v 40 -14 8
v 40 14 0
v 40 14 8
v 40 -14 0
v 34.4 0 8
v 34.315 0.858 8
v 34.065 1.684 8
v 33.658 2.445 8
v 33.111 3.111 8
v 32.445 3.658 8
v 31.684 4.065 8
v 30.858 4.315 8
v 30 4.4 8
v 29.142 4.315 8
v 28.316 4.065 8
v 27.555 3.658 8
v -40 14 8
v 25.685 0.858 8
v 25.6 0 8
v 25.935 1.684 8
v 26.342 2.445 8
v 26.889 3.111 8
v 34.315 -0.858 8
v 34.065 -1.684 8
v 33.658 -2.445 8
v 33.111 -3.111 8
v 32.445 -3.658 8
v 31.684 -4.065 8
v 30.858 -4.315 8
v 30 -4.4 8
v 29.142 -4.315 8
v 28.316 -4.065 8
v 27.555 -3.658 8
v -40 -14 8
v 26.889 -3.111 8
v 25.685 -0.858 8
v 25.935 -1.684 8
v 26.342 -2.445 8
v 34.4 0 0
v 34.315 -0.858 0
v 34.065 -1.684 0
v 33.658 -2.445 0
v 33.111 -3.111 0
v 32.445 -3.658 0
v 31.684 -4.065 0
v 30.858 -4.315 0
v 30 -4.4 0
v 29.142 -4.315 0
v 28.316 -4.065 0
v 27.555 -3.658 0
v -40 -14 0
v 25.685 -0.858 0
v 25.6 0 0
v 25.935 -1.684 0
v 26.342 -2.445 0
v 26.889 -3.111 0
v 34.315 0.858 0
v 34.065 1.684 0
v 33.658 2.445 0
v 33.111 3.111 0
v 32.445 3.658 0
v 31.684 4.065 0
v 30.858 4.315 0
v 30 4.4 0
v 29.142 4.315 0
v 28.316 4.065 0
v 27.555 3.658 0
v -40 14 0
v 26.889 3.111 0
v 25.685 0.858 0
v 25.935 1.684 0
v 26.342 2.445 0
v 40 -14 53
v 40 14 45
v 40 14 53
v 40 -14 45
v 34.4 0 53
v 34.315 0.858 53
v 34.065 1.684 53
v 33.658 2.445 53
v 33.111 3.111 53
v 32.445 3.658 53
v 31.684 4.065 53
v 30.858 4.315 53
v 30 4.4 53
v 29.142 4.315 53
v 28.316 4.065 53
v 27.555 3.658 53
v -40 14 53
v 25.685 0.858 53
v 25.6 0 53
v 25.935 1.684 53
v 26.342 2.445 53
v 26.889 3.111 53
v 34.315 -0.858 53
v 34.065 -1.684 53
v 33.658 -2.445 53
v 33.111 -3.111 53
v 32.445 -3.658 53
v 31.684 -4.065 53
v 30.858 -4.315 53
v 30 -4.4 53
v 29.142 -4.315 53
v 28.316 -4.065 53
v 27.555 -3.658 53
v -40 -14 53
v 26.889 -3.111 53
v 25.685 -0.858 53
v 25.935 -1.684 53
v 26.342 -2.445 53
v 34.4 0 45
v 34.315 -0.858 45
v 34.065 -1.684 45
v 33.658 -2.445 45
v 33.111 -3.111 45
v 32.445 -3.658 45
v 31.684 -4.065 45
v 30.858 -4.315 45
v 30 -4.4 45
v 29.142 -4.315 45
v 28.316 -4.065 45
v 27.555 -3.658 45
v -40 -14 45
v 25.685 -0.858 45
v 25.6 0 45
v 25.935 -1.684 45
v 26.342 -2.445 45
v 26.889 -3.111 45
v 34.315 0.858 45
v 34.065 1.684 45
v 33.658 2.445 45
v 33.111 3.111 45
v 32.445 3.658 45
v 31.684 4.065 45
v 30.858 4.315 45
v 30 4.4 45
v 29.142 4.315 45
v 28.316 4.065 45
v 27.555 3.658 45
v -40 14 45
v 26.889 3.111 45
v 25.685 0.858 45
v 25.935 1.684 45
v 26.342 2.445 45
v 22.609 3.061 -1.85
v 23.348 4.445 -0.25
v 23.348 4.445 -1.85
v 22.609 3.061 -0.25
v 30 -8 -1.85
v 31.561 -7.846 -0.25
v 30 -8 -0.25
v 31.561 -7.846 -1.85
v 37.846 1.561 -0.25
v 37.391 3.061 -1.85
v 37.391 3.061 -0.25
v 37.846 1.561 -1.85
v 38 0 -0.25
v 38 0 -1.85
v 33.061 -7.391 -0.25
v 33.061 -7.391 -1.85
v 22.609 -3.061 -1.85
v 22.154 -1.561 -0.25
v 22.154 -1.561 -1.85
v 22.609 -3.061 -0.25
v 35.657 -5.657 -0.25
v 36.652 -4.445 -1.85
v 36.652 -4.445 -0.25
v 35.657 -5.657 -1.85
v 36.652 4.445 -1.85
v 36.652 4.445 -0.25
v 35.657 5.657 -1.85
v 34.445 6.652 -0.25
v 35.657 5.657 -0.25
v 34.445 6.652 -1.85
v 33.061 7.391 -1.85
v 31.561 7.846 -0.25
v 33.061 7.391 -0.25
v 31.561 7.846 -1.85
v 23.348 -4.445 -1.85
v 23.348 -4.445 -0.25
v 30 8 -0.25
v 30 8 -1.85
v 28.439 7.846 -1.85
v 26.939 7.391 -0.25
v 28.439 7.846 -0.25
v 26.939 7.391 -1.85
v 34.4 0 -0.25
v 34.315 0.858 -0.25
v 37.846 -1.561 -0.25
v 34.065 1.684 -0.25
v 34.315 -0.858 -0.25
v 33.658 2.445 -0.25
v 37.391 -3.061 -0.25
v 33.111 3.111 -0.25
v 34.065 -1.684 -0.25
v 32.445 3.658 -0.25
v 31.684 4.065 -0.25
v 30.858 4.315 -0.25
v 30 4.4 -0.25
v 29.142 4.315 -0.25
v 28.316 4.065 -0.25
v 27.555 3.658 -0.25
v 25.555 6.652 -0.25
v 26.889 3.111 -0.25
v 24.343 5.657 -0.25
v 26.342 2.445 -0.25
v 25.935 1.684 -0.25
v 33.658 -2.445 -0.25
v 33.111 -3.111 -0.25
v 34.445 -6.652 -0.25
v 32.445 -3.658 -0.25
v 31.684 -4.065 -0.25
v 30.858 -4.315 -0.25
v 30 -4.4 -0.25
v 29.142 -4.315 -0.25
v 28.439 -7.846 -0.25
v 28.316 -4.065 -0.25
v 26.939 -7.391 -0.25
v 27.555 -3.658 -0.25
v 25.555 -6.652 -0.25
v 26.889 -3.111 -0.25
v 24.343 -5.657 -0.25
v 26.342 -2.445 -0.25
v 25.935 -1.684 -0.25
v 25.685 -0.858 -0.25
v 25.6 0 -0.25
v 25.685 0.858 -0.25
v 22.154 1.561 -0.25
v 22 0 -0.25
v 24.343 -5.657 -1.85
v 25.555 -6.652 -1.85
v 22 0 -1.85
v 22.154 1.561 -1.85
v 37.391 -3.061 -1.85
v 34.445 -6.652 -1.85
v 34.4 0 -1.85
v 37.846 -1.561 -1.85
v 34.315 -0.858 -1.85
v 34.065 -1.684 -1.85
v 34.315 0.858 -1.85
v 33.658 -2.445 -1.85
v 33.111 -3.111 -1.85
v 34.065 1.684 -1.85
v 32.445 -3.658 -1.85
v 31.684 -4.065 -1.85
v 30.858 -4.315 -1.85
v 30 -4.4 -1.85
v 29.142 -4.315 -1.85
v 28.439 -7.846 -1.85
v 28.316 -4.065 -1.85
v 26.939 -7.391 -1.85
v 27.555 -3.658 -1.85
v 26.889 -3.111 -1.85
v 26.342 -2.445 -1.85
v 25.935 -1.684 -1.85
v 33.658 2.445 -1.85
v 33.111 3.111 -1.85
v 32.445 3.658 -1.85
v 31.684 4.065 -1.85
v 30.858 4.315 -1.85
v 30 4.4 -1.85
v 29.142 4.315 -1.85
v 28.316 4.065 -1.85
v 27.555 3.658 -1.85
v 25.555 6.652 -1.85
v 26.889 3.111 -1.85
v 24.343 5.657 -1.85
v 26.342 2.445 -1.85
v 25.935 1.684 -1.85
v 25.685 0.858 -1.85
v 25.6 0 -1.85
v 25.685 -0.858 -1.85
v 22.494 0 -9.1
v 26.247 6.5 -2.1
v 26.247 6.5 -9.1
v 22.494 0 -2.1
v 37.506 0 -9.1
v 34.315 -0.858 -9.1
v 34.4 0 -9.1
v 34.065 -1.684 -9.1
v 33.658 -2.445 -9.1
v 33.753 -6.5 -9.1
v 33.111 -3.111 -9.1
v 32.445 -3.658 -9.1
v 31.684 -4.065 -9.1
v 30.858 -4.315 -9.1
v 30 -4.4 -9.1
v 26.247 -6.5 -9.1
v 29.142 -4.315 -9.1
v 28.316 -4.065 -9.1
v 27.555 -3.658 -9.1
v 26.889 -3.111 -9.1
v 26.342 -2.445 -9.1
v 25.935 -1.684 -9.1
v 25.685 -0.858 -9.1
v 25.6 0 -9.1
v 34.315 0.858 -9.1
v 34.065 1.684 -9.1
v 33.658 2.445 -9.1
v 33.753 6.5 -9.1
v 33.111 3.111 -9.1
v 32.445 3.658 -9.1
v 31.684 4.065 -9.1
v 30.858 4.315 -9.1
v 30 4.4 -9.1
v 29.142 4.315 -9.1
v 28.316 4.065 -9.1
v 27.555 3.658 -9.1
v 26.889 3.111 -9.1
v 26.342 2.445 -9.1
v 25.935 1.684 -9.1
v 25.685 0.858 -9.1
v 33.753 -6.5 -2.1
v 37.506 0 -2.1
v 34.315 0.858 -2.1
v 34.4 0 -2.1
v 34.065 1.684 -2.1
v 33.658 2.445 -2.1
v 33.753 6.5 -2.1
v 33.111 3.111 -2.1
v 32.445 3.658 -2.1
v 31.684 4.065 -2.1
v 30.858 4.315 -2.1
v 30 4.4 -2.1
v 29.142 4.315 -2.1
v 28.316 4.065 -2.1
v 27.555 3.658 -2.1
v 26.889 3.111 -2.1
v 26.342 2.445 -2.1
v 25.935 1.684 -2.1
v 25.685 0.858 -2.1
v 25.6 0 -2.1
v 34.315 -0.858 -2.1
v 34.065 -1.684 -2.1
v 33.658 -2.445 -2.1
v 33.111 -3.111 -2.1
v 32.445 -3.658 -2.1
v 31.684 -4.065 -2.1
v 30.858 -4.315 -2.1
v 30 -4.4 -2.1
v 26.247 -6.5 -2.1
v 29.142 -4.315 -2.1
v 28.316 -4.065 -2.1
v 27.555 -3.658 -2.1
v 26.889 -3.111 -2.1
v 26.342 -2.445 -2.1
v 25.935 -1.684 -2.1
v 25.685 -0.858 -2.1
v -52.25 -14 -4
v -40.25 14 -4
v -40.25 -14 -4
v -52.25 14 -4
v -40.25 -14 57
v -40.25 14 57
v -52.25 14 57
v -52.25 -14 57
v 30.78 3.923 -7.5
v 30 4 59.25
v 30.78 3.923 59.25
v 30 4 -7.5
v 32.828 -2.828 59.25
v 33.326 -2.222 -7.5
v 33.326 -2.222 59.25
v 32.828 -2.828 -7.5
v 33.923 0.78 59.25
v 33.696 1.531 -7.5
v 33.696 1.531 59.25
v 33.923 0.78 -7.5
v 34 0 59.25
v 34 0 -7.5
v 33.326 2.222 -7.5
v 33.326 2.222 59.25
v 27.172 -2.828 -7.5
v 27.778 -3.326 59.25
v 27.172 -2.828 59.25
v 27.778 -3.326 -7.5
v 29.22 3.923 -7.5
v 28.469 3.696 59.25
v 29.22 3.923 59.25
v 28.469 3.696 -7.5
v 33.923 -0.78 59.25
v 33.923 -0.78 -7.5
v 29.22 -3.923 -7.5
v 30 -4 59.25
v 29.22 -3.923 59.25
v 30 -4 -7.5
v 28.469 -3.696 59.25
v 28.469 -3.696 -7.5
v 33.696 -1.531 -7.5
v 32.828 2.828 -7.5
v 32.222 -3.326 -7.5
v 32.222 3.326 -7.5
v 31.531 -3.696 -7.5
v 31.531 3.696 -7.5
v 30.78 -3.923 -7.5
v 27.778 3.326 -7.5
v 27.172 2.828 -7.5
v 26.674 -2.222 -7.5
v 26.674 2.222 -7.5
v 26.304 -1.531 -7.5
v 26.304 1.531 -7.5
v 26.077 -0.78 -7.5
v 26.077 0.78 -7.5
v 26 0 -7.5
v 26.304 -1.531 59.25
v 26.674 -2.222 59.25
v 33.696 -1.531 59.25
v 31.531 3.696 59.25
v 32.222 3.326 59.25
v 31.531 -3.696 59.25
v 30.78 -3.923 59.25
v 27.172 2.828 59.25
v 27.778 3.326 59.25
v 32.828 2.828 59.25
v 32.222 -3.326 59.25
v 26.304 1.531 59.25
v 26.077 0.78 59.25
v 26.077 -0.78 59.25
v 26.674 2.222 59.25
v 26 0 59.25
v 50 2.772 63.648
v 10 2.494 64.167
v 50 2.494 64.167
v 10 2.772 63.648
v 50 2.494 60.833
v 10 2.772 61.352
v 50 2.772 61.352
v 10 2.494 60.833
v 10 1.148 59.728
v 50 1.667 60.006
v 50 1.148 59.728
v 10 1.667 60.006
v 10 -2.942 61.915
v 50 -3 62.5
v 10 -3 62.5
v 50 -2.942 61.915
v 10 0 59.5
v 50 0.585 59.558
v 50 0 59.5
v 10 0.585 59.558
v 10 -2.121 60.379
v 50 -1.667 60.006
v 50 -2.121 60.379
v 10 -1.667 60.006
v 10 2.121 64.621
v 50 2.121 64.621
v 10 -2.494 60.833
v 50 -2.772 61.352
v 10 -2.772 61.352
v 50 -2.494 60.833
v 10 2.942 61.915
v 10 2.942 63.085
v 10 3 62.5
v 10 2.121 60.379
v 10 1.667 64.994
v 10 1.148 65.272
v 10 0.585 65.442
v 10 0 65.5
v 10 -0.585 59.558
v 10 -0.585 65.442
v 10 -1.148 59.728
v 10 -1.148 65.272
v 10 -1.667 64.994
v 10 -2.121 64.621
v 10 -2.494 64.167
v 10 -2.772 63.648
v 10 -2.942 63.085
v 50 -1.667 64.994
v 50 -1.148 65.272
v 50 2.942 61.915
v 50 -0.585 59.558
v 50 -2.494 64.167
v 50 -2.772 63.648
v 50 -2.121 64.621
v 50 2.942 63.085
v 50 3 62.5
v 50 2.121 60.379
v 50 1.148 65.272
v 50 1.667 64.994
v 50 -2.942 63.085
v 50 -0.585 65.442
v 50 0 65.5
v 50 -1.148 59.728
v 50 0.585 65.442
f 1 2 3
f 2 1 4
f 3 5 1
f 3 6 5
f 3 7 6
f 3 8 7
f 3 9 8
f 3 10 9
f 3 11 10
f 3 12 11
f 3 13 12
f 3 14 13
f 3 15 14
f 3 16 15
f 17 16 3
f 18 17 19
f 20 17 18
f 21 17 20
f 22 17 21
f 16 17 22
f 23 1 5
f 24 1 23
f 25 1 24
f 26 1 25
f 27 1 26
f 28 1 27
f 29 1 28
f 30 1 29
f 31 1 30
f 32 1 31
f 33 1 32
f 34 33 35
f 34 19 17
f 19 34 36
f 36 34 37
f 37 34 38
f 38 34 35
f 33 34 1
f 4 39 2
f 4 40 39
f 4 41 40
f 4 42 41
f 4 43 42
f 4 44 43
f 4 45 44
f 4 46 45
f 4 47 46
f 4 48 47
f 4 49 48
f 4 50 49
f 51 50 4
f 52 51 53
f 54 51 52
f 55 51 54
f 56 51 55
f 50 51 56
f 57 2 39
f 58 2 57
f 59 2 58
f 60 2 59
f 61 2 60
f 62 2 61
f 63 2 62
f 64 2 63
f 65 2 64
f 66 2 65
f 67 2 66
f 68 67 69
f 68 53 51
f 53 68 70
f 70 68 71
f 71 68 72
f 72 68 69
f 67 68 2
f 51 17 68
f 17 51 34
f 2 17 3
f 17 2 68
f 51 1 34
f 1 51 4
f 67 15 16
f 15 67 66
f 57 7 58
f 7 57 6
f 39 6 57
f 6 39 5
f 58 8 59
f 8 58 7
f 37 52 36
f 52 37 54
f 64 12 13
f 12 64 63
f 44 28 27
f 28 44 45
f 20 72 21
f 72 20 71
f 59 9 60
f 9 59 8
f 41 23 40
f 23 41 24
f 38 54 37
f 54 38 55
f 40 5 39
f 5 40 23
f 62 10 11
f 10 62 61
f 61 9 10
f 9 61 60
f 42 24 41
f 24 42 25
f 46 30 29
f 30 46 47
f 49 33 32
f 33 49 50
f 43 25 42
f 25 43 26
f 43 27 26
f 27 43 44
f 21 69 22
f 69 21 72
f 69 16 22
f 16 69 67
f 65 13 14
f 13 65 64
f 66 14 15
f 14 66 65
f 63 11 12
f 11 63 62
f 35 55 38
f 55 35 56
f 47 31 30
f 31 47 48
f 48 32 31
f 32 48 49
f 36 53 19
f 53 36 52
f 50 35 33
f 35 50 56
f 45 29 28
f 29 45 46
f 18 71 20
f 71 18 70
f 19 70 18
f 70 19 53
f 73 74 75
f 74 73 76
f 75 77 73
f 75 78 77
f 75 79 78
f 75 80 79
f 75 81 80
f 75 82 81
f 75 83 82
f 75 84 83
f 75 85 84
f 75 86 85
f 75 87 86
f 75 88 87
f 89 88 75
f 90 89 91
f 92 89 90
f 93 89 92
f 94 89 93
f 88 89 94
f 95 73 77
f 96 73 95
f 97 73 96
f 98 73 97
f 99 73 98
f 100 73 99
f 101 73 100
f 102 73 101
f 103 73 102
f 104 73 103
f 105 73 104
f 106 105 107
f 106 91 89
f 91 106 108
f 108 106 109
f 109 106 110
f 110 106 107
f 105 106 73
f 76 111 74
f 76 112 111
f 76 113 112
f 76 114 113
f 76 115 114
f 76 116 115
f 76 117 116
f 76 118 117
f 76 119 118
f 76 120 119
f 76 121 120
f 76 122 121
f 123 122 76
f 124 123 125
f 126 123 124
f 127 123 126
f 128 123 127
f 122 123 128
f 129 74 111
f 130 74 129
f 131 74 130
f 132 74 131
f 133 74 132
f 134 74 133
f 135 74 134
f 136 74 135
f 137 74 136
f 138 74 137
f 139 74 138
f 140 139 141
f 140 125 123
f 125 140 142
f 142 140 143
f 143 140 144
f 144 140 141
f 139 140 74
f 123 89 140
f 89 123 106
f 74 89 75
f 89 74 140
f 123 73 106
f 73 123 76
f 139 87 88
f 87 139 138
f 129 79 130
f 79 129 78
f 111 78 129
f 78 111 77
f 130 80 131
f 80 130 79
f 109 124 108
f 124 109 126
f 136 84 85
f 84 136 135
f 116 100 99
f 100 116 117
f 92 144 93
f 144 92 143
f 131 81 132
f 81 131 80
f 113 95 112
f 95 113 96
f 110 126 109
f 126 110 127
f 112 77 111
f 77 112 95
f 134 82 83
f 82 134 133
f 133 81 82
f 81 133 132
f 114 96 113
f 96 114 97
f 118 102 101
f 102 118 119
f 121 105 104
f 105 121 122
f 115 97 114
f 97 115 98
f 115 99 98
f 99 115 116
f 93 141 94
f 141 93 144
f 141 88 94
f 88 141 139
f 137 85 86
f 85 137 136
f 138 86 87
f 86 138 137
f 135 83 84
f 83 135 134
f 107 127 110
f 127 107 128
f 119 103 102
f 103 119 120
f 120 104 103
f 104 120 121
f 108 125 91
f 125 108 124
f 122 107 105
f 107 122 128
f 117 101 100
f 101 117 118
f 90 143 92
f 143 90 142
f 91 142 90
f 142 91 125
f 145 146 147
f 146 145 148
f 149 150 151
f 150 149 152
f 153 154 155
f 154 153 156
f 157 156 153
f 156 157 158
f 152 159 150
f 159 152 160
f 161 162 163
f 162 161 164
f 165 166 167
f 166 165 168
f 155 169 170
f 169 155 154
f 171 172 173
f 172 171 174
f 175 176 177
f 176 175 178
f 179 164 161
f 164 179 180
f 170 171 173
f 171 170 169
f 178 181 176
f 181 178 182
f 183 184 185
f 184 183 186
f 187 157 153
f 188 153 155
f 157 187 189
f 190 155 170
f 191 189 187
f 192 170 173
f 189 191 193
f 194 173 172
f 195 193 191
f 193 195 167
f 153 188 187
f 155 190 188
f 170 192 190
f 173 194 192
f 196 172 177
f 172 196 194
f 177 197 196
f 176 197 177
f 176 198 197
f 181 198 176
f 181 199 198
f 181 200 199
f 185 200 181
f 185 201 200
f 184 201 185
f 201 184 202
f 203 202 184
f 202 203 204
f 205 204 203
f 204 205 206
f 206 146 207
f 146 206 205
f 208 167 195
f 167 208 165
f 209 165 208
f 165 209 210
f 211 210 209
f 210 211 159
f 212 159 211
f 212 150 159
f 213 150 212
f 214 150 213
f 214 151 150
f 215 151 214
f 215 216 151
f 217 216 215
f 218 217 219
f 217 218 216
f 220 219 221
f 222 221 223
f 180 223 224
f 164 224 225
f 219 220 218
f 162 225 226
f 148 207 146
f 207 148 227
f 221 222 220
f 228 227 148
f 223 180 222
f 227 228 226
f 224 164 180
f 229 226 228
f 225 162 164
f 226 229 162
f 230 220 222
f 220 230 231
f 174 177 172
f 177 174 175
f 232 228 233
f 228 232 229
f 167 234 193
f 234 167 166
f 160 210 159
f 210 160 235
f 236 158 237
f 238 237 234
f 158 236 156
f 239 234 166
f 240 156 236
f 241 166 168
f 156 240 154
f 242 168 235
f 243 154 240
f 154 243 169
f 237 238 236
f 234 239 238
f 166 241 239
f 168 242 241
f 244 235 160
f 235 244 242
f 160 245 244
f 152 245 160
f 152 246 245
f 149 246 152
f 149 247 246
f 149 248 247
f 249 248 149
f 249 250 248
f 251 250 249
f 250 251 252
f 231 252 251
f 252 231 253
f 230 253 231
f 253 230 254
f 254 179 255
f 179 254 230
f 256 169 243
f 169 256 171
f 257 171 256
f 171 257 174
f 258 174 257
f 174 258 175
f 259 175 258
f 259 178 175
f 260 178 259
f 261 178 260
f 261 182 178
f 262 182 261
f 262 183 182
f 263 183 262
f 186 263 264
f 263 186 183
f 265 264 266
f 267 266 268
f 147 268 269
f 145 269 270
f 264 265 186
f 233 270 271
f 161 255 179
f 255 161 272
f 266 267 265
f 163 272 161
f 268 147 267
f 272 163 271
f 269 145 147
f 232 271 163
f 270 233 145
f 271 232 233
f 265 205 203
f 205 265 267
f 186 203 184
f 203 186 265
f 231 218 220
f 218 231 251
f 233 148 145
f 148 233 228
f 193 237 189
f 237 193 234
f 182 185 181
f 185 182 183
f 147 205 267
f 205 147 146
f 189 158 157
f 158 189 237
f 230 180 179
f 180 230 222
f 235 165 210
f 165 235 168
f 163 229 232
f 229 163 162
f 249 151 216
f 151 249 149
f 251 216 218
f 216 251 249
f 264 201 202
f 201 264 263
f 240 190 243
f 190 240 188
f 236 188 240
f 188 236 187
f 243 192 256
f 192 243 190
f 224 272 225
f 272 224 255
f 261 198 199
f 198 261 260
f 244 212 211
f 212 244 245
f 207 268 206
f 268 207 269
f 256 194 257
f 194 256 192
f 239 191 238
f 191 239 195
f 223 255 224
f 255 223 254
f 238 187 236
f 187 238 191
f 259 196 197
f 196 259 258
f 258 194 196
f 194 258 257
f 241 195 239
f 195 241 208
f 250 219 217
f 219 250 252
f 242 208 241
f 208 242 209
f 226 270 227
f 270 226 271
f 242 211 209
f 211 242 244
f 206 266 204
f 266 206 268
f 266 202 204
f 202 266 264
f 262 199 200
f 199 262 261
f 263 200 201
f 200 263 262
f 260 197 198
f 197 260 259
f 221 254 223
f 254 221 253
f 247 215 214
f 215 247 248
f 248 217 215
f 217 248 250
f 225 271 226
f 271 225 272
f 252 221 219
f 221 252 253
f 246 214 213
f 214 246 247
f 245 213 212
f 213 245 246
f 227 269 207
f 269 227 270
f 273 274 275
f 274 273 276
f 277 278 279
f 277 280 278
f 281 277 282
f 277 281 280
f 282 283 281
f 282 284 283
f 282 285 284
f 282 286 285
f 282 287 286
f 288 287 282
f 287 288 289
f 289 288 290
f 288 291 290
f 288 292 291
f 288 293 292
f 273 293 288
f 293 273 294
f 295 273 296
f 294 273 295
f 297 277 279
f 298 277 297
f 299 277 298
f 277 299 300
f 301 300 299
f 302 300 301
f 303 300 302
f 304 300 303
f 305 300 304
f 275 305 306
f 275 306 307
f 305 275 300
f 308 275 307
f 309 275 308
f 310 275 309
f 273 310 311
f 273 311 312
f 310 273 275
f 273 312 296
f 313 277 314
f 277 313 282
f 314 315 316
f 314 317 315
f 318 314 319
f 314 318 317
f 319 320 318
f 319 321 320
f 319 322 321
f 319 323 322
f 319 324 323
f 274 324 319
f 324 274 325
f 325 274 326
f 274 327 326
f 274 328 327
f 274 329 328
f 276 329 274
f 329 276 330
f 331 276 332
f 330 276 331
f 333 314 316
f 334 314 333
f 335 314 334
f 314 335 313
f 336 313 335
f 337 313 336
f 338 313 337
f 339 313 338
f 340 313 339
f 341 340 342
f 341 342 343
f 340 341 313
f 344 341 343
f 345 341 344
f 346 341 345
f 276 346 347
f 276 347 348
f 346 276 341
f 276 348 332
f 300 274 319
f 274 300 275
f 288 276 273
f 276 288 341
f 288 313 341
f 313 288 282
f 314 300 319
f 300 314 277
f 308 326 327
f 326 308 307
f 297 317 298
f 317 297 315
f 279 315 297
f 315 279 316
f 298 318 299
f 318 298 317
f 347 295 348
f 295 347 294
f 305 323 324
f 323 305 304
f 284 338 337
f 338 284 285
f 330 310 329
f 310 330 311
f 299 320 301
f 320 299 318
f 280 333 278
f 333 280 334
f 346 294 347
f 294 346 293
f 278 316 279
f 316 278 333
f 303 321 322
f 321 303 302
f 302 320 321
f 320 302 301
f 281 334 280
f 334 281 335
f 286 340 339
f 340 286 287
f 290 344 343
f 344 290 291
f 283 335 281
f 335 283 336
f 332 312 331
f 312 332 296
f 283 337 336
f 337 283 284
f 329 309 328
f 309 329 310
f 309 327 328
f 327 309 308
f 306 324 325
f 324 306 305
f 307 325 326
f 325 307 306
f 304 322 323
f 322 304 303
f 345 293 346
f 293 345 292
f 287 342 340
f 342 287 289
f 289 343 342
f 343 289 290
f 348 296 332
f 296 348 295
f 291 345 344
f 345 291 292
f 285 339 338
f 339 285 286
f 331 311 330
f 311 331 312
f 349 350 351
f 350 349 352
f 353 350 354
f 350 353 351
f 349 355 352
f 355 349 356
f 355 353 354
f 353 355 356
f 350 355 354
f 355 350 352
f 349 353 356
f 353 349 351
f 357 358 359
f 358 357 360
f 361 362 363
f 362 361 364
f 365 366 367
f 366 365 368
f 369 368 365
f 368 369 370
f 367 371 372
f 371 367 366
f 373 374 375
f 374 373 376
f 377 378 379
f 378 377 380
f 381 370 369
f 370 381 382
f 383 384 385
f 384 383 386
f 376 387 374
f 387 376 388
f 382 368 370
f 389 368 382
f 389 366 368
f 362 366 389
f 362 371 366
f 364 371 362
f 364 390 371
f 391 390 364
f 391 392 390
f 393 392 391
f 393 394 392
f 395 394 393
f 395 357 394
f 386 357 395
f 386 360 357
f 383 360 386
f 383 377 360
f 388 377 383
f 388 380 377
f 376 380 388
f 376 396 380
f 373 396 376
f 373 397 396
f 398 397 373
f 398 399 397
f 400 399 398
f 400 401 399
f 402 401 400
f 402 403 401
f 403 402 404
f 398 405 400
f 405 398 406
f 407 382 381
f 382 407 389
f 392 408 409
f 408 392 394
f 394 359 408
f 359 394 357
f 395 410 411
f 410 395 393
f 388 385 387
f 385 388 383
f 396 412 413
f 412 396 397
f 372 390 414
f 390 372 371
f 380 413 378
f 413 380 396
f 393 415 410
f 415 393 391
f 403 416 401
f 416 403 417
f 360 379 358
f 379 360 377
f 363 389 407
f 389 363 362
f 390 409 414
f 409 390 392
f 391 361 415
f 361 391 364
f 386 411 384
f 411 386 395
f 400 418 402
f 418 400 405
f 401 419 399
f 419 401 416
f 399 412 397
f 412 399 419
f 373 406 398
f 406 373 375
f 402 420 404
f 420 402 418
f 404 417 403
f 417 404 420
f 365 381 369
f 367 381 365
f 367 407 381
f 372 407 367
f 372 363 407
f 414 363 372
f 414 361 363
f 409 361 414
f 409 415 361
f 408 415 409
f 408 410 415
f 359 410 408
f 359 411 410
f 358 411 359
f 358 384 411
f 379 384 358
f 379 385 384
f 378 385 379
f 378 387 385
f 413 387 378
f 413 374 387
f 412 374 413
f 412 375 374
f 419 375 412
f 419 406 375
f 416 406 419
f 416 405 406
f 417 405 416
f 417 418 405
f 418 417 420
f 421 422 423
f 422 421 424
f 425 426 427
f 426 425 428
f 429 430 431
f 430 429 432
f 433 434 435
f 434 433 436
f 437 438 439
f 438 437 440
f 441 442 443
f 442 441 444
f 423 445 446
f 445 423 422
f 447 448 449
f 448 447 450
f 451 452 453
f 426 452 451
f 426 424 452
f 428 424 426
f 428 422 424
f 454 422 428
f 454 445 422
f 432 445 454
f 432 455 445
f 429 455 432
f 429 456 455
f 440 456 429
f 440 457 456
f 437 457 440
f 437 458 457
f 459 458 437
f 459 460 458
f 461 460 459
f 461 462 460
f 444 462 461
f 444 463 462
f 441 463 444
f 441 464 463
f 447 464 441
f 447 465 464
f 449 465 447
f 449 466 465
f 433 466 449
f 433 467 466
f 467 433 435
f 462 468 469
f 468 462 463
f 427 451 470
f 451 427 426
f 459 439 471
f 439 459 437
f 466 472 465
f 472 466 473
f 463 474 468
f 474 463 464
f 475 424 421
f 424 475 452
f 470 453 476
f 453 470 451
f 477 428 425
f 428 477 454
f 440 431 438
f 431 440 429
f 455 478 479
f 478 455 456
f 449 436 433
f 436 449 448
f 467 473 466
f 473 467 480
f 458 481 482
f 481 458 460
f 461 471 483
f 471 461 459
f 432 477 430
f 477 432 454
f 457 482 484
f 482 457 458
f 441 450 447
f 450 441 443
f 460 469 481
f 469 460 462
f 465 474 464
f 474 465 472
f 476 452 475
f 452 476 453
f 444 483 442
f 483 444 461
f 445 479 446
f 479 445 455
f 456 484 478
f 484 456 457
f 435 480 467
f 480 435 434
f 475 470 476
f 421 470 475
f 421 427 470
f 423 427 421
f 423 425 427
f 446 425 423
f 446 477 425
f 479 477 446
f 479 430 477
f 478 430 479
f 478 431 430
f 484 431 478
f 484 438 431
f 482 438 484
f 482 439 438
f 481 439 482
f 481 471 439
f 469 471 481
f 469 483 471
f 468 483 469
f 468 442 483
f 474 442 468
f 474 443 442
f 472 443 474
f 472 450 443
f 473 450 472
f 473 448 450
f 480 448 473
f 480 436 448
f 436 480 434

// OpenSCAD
$fn = 32;

// ------------------------------------------------------------------------
// C clamp: throat 45 mm, screw d8
// Every part is its own module, assembly() places every instance.
// ------------------------------------------------------------------------

// --- part 1 ---
module clamp_arm() {
  difference() {
    translate([-40, -14, 0]) cube([80, 28, 8]);
    translate([30, 0, -1]) cylinder(h = 10, d = 8.8);
  }
}

// --- part 2 ---
module clamp_spine() {
  difference() {
    translate([-30.5, -14, 0]) cube([61, 28, 12]);
  }
}

// --- part 3 ---
module clamp_screw() {
  translate([0, 0, -33.375]) cylinder(h = 66.75, d = 8);
}

// --- part 4 ---
module clamp_washer() {
  difference() {
      translate([0, 0, 0]) cylinder(h = 1.6, d = 16);
      translate([0, 0, -1]) cylinder(h = 3.6, d = 8.8);
    }
}

// --- part 5 ---
module clamp_nut() {
  difference() {
    linear_extrude(height = 7) polygon(points = [[7.506, 0], [3.753, 6.5], [-3.753, 6.5], [-7.506, 0], [-3.753, -6.5], [3.753, -6.5]]);
    translate([0, 0, -1]) cylinder(h = 9, d = 8.8);
  }
}

// --- part 6 ---
module tommy_bar() {
  translate([0, 0, -20]) cylinder(h = 40, d = 6);
}

// --- assembly ---
module assembly() {
  color([0.80, 0.24, 0.20]) translate([0, 0, 0]) rotate([0, 0, 0]) clamp_arm();
  color([0.20, 0.45, 0.75]) translate([0, 0, 45]) rotate([0, 0, 0]) clamp_arm();
  color([0.25, 0.62, 0.32]) translate([-52.25, 0, 26.5]) rotate([0, 90, 0]) clamp_spine();
  color([0.92, 0.70, 0.18]) translate([30, 0, 25.875]) rotate([0, 0, 0]) clamp_screw();
  color([0.58, 0.35, 0.70]) translate([30, 0, -1.85]) rotate([0, 0, 0]) clamp_washer();
  color([0.16, 0.66, 0.66]) translate([30, 0, -9.1]) rotate([0, 0, 0]) clamp_nut();
  color([0.85, 0.48, 0.18]) translate([30, 0, 62.5]) rotate([0, 90, 0]) tommy_bar();
}

assembly();
